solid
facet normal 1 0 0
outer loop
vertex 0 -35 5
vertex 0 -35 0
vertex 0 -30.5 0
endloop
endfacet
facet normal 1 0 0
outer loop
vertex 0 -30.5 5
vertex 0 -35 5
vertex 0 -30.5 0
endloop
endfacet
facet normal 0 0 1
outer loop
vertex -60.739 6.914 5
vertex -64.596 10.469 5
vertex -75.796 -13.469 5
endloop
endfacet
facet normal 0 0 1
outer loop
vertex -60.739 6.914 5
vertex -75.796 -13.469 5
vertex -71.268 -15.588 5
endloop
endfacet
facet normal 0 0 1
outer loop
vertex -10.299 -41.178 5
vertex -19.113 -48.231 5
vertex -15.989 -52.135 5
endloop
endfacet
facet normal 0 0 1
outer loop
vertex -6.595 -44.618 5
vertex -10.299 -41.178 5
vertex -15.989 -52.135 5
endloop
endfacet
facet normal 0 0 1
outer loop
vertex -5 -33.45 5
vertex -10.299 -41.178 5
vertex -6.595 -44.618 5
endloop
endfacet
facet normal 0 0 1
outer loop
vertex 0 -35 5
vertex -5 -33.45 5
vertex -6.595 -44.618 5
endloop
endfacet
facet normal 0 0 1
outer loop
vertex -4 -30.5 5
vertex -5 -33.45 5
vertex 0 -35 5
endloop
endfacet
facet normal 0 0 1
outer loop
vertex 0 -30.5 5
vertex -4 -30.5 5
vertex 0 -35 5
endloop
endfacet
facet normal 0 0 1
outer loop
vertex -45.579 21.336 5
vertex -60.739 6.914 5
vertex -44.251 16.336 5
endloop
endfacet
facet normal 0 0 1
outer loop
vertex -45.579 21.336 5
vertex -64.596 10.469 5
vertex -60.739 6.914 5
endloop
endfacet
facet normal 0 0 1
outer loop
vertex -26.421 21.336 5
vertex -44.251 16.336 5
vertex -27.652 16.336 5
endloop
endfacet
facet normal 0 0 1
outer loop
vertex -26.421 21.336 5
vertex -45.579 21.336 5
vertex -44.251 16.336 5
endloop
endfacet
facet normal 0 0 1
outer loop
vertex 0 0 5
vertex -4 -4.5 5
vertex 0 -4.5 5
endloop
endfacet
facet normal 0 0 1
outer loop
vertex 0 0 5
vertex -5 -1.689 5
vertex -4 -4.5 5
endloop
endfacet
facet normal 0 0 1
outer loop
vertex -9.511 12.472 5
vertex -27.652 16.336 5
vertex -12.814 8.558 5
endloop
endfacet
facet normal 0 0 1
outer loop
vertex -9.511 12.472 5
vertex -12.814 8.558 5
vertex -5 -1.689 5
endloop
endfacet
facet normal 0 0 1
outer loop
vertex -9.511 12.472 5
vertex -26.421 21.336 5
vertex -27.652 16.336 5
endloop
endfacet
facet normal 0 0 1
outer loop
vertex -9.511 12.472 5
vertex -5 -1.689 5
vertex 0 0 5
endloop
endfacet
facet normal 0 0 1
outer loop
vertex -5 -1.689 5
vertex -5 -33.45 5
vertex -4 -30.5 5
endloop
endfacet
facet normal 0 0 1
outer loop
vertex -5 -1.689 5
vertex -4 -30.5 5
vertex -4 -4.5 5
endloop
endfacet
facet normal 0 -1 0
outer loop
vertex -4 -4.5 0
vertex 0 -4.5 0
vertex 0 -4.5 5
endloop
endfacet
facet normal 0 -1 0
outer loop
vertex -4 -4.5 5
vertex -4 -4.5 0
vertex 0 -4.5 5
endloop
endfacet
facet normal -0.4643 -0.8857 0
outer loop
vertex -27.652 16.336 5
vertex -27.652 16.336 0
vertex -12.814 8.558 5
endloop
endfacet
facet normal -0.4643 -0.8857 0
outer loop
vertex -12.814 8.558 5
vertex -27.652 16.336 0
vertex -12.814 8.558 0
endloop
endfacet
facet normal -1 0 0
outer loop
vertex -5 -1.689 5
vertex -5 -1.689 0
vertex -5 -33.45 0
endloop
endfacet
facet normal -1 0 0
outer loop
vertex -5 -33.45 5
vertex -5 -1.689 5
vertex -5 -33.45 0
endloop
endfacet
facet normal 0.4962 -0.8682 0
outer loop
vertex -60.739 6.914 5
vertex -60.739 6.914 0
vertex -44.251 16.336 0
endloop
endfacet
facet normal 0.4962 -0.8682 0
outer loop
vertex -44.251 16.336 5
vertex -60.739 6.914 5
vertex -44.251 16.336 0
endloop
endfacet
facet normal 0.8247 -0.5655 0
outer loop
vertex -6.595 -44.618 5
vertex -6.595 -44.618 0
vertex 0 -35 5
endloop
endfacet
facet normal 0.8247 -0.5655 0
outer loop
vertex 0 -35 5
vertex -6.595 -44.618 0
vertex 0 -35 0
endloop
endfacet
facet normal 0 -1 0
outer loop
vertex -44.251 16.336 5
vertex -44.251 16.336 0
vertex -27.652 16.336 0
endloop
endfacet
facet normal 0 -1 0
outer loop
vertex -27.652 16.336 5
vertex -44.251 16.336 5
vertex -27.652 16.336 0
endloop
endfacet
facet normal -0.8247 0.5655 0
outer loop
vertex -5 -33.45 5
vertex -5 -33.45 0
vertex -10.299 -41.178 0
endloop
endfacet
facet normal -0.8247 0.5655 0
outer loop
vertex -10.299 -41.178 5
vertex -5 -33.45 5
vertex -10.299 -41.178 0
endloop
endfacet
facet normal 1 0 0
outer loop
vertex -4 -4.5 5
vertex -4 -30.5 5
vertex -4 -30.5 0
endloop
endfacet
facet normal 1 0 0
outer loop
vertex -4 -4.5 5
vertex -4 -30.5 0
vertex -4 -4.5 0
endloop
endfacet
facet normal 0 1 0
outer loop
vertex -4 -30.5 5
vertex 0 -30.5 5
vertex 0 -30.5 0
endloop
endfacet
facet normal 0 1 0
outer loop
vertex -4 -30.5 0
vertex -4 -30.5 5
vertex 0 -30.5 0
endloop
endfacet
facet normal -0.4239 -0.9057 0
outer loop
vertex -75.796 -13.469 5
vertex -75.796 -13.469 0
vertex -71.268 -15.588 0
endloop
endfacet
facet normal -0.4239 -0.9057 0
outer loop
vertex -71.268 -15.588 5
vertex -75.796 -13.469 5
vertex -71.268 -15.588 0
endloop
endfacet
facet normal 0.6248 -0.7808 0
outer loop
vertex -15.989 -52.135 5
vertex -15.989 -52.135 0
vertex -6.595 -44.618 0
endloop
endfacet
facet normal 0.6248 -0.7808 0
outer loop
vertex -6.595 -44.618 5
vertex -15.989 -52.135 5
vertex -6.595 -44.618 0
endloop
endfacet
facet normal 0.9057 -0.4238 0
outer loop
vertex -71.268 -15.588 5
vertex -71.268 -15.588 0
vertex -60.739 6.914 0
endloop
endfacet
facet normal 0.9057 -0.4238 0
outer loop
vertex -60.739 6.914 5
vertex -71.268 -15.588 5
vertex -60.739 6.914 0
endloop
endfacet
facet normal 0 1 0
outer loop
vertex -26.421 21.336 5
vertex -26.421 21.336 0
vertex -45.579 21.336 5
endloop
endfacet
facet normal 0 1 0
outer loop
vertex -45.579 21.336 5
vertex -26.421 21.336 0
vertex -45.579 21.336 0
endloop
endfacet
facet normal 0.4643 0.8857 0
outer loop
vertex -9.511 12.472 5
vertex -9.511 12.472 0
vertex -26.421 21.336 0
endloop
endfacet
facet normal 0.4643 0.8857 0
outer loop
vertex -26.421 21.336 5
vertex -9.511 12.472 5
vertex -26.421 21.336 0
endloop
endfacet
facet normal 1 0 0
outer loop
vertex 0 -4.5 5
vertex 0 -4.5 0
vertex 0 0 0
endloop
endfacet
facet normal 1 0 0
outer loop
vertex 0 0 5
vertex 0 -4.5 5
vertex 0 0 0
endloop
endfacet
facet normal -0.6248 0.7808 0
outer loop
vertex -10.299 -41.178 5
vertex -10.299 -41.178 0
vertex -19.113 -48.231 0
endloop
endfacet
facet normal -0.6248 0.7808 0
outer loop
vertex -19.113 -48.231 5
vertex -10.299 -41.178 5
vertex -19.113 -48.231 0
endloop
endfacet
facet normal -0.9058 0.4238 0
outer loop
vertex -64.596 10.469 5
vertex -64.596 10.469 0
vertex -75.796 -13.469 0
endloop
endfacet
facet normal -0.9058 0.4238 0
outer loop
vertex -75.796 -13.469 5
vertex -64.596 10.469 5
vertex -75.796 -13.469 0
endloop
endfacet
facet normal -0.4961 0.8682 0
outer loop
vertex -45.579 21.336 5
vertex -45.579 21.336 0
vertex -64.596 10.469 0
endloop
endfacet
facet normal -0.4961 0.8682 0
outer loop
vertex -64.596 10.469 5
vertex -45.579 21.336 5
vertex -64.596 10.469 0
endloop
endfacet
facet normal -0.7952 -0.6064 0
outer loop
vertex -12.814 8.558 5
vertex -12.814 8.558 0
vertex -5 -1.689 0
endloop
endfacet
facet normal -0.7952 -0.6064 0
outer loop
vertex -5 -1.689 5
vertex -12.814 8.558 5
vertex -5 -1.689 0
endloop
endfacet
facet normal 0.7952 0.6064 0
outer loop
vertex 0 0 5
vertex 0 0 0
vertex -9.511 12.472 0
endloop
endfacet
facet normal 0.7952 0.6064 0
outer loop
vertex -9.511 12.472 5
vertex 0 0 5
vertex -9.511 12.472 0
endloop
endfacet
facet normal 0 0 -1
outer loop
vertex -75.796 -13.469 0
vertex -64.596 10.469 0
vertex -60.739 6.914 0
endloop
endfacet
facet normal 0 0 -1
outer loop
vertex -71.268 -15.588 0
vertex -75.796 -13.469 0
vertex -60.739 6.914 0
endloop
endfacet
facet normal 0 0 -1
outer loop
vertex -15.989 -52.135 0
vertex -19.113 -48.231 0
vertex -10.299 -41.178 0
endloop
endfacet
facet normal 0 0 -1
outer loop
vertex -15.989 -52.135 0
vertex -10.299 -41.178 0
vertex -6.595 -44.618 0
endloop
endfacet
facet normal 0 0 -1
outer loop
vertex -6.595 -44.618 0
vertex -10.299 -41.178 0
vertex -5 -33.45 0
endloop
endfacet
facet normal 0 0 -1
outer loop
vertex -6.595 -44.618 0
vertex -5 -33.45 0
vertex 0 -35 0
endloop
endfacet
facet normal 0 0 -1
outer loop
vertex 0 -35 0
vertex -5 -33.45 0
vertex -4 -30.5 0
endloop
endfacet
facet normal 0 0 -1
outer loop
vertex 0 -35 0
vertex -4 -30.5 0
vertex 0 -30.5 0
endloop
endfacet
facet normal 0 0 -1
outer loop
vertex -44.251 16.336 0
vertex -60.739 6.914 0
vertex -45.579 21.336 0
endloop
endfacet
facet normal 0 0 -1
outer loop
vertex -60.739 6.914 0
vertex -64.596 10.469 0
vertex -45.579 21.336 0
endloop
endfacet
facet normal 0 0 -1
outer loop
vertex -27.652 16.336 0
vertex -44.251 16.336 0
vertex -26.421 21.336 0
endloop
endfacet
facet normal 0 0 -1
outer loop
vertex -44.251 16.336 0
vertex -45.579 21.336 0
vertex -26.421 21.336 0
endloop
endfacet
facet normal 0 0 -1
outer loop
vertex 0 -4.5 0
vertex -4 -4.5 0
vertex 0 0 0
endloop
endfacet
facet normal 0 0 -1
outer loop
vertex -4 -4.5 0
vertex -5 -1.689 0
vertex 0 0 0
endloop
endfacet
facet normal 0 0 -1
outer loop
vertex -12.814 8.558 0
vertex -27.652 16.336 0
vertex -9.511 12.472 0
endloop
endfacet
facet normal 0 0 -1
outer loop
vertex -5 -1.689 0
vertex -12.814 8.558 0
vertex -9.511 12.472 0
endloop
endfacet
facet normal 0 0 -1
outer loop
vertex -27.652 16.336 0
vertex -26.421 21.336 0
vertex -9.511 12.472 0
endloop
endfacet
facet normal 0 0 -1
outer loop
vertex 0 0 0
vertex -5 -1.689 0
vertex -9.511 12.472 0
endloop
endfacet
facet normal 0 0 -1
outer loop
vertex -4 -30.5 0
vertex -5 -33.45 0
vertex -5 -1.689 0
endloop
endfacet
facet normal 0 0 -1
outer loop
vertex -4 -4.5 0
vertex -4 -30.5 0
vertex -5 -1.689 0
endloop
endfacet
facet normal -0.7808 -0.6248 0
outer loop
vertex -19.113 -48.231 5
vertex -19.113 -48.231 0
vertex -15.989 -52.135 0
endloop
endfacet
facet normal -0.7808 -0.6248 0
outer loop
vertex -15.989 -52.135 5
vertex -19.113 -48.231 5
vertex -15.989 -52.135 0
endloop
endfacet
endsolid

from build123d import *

# Parameters (mm, degrees)
F1_DEPTH = 5
F3_DEPTH = 4


with BuildPart() as f1:
    # F0 (on Top) → F1 (new body)
    with BuildSketch(Plane.XY):
        Polygon((0, -35), (0, 0), (-9.510925, 12.472135), (-26.420884, 21.336073), (-45.579116, 21.336073), (-64.596242, 10.46882), (-75.796338, -13.468692), (-71.267544, -15.587665), (-60.739219, 6.914099), (-44.251259, 16.33607), (-27.65191, 16.33607), (-12.814397, 8.558477), (-5.000003, -1.688916), (-5.000003, -33.450294), (-10.299125, -41.177687), (-19.113462, -48.230996), (-15.989488, -52.134945), (-6.595456, -44.617758), align=None)
    extrude(amount=F1_DEPTH)

    # F2 (on face) → F3 (cut)
    with BuildSketch(Plane.YZ):
        Polygon((-4.5, 0), (-4.5, 2.5), (-4.5, 5), (-30.5, 5), (-30.5, 2.5), (-30.5, 0), align=None)
    extrude(amount=-F3_DEPTH, mode=Mode.SUBTRACT)


with BuildPart() as f4_1:
    # F4: copy of F1
    add(f1.part)


solid = f4_1.part
